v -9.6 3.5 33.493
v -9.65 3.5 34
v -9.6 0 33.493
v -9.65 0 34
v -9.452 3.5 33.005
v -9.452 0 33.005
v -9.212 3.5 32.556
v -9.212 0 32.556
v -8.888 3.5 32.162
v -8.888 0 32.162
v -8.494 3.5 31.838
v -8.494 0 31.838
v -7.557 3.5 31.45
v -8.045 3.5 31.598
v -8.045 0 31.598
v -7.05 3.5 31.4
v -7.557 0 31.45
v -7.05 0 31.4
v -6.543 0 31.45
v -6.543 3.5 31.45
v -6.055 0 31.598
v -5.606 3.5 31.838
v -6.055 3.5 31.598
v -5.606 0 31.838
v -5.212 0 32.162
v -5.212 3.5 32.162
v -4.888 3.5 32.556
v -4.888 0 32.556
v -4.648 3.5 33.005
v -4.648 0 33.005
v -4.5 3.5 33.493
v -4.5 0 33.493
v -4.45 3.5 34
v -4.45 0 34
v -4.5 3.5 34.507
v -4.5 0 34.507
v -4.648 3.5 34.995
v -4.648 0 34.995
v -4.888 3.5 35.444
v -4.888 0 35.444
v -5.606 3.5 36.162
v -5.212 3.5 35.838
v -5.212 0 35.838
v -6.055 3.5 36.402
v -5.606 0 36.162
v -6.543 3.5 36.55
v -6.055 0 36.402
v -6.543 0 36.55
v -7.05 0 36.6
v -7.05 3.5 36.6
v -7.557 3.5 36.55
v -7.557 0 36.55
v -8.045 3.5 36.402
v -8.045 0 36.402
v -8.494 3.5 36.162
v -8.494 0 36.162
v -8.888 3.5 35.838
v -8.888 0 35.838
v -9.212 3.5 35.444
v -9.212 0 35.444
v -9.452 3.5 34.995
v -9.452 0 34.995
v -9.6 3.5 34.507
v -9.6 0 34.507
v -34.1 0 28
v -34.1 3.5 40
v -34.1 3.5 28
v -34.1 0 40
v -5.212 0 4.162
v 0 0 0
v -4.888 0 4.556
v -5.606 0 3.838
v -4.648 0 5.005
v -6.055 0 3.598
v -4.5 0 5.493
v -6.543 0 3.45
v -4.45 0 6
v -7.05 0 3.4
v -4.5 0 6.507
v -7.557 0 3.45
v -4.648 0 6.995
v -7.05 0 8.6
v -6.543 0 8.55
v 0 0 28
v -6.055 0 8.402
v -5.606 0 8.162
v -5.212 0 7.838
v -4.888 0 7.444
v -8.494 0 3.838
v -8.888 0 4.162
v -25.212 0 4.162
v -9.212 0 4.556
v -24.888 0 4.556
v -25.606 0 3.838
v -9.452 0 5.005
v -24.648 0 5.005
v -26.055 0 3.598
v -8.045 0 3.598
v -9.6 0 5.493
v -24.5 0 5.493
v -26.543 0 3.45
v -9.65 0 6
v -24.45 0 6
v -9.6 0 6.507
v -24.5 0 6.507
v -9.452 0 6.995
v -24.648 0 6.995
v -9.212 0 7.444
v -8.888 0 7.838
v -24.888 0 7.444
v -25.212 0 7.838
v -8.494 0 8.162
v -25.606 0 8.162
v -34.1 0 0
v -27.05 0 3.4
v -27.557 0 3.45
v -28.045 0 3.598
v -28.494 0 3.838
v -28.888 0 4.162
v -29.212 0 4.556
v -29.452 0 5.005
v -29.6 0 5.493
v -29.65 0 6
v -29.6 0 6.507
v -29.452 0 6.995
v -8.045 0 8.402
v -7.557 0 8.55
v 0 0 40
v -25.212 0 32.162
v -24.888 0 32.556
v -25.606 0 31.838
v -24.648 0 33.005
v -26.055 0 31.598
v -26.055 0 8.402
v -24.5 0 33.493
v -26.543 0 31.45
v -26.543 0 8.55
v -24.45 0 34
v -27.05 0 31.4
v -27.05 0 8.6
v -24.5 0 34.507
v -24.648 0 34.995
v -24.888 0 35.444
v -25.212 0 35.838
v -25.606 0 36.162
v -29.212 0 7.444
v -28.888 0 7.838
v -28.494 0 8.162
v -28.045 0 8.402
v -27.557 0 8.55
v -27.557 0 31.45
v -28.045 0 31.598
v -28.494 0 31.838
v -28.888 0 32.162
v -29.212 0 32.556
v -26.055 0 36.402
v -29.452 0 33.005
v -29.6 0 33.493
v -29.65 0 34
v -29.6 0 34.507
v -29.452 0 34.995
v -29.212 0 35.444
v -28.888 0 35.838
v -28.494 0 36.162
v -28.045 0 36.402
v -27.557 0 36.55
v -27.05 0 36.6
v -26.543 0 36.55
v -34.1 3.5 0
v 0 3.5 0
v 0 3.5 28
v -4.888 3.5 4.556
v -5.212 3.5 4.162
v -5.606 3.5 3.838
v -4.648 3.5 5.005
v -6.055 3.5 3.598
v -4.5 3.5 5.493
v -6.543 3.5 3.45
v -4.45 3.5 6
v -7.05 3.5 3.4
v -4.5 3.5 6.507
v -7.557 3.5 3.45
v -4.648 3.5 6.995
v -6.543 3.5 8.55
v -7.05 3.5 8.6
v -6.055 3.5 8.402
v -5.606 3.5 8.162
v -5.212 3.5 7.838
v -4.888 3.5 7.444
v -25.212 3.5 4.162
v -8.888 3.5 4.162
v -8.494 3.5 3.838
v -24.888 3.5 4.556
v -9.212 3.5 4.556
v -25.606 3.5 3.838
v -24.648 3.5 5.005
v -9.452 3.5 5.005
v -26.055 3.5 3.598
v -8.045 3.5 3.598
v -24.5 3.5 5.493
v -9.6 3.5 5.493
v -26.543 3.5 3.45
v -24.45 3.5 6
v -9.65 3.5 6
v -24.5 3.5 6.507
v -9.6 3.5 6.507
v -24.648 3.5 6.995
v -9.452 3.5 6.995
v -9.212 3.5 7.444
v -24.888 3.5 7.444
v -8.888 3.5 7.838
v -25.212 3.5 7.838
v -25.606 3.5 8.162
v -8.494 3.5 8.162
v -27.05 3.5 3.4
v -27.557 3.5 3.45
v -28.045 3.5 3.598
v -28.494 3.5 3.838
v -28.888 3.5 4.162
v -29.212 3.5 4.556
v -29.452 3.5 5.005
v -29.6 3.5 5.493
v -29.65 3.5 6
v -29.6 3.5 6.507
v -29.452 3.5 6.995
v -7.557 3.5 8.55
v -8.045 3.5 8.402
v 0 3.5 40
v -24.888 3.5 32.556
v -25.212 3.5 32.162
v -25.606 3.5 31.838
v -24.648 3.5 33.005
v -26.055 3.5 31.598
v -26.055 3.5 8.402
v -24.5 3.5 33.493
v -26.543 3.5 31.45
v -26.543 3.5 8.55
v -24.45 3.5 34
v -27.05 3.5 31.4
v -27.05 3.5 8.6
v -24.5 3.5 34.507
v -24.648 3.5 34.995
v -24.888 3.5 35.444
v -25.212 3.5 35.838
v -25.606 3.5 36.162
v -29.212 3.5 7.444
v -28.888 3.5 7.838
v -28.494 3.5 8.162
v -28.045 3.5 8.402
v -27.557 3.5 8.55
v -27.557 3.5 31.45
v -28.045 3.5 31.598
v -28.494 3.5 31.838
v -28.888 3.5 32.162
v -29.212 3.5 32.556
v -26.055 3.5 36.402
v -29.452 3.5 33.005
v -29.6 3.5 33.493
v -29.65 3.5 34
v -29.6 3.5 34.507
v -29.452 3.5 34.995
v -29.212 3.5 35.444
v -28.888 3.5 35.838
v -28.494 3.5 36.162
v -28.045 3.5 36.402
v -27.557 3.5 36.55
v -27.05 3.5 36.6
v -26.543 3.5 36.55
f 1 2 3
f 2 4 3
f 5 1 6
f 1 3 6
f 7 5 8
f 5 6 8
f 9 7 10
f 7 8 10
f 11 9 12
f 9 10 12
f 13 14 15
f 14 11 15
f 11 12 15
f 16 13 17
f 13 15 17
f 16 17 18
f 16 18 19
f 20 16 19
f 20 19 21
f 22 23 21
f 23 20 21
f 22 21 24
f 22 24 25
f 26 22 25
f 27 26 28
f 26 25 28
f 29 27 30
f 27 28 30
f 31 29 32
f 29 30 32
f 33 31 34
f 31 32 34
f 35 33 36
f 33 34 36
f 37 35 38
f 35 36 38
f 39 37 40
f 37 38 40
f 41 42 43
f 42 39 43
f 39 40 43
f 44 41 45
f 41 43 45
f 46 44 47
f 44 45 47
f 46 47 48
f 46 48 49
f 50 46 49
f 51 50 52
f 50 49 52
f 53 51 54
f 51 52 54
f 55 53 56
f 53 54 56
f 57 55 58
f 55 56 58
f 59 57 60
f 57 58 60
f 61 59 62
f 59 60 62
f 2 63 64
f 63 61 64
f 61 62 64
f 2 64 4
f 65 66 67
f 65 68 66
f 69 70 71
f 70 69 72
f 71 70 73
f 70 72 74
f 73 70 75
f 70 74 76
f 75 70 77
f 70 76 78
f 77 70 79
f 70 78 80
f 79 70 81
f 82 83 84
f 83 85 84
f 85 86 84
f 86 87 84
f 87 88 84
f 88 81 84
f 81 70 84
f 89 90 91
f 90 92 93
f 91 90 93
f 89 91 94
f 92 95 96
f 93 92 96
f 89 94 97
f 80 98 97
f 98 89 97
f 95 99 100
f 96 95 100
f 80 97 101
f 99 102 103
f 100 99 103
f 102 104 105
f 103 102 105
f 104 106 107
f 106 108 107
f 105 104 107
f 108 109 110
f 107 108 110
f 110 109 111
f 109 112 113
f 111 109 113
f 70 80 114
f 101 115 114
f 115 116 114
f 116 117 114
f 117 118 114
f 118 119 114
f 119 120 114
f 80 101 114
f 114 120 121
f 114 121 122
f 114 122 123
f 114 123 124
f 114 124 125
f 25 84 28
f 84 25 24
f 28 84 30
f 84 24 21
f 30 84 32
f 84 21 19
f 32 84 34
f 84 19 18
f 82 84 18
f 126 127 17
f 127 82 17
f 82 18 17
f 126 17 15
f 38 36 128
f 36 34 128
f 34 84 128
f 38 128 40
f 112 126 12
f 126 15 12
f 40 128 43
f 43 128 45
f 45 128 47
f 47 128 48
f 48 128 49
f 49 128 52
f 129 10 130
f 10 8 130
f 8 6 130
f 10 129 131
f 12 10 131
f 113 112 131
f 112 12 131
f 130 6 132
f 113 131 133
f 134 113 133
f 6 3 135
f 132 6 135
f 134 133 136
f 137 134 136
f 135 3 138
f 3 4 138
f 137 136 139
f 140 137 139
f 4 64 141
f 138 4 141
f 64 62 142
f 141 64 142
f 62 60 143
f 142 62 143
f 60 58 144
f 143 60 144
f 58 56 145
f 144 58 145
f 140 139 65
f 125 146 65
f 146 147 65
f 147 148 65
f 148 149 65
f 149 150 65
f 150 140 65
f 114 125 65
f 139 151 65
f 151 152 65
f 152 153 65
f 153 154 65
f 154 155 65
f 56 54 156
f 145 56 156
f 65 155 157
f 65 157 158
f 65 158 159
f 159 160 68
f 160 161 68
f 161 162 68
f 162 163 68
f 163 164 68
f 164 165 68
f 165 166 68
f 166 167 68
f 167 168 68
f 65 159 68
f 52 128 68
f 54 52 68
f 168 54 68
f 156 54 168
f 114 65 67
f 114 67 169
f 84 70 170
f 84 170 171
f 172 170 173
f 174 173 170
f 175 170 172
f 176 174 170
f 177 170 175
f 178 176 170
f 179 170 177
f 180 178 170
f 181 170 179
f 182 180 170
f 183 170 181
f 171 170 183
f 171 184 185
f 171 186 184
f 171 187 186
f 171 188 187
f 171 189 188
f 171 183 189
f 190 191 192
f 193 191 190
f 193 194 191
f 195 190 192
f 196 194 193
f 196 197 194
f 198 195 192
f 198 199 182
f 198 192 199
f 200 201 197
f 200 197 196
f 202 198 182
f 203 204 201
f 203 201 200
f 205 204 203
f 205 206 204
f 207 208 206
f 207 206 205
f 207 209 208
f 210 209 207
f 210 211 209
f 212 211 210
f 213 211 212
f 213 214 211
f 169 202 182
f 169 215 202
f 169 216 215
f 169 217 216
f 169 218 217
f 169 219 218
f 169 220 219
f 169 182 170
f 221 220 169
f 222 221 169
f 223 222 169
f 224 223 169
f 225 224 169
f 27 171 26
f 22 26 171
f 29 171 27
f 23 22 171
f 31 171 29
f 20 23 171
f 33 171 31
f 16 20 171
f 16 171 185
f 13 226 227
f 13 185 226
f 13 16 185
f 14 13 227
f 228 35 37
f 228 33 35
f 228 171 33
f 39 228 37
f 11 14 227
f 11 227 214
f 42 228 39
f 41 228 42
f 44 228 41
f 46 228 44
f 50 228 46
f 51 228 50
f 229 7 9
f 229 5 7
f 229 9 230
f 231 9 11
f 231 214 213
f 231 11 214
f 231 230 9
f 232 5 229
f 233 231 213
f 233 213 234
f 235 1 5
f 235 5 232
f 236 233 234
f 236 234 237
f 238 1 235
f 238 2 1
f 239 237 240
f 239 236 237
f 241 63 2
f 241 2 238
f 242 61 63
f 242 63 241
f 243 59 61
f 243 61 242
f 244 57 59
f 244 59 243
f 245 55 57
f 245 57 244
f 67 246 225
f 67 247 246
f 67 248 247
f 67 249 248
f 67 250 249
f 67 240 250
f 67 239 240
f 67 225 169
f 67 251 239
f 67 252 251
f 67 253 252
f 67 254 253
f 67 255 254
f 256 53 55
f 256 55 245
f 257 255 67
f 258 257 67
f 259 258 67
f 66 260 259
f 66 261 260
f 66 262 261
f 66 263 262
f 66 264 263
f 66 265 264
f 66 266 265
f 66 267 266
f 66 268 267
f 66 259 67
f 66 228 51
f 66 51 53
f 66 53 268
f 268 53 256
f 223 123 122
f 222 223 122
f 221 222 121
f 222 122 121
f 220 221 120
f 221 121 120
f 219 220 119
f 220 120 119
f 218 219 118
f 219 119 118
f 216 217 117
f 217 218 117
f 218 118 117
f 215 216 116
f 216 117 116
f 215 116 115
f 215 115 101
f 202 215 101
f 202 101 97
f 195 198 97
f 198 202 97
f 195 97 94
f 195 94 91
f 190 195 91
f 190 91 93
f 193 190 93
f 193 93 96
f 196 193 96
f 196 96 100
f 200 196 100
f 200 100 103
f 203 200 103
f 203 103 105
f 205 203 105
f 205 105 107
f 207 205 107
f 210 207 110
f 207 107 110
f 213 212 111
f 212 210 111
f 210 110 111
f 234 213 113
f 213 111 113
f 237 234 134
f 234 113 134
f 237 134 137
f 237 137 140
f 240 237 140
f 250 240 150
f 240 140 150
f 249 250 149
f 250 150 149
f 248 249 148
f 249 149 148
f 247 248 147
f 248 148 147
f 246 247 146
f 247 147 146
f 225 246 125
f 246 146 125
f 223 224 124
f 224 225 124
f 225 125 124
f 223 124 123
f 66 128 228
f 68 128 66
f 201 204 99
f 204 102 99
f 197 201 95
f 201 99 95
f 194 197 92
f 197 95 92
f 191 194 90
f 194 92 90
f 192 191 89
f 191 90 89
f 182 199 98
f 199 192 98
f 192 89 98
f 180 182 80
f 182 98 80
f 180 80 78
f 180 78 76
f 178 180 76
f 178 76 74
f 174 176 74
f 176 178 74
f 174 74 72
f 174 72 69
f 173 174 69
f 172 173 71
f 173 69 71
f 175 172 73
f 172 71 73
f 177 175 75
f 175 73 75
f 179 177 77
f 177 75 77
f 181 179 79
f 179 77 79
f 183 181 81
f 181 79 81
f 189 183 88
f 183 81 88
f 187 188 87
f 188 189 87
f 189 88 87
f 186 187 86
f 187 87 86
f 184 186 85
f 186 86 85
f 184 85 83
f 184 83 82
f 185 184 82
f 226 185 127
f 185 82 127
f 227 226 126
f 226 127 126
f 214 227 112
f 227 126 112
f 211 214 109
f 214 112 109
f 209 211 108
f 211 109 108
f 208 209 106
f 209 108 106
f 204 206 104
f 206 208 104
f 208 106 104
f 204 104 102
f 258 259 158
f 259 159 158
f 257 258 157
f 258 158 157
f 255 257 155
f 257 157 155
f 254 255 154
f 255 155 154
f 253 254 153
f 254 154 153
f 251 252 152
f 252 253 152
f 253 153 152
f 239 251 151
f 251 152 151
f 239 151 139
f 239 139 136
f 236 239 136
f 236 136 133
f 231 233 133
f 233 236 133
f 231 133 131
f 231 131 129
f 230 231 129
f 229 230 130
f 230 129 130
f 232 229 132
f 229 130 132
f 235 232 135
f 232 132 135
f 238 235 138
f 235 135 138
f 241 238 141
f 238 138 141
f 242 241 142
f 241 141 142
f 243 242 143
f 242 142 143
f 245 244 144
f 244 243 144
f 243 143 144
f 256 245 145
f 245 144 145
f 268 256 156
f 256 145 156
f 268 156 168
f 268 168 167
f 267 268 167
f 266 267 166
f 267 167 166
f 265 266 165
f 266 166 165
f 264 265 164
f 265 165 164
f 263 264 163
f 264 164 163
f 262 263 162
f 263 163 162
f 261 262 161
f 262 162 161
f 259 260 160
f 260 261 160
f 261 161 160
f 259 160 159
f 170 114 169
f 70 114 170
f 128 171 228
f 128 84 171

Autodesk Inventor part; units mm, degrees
ref_plane "YZ Plane" through (0, 0, 0) normal (1, 0, 0) x (0, 1, 0)
ref_plane "XZ Plane" through (0, 0, 0) normal (0, 1, 0) x (-1, 0, 0)
ref_plane "XY Plane" through (0, 0, 0) normal (0, 0, 1) x (1, 0, 0)
sketch "Sketch1" plane through (0, 0, 0) normal (0, 1, 0) x (-1, 0, 0)
  line L0 (17.2372, 12) -> (17.2372, 28) construction
  line L1 (14.9628, 12) -> (17.2372, 12) construction
  line L2 (14.9628, 12) -> (14.9628, 28) construction
  line L3 (17.2372, 28) -> (14.9628, 28) construction
  line L4 (14.2372, 12) -> (14.2372, 28) construction
  line L5 (11.9628, 12) -> (14.2372, 12) construction
  line L6 (11.9628, 12) -> (11.9628, 28) construction
  line L7 (14.2372, 28) -> (11.9628, 28) construction
  line L8 (20.2372, 28) -> (17.9628, 28) construction
  line L9 (20.2372, 12) -> (20.2372, 28) construction
  line L10 (17.9628, 12) -> (20.2372, 12) construction
  line L11 (17.9628, 12) -> (17.9628, 28) construction
  line L12 (11.2372, 12) -> (11.2372, 28) construction
  line L13 (8.9628, 12) -> (11.2372, 12) construction
  line L14 (8.9628, 12) -> (8.9628, 28) construction
  line L15 (11.2372, 28) -> (8.9628, 28) construction
  line L16 (23.2372, 28) -> (20.9628, 28) construction
  line L17 (23.2372, 12) -> (23.2372, 28) construction
  line L18 (20.9628, 12) -> (23.2372, 12) construction
  line L19 (20.9628, 12) -> (20.9628, 28) construction
  line L20 (8.2372, 12) -> (8.2372, 28) construction
  line L21 (5.9628, 12) -> (8.2372, 12) construction
  line L22 (5.9628, 12) -> (5.9628, 28) construction
  line L23 (8.2372, 28) -> (5.9628, 28) construction
  line L24 (26.2372, 28) -> (23.9628, 28) construction
  line L25 (26.2372, 12) -> (26.2372, 28) construction
  line L26 (23.9628, 12) -> (26.2372, 12) construction
  line L27 (23.9628, 12) -> (23.9628, 28) construction
  line L28 (5.2372, 12) -> (5.2372, 28) construction
  line L29 (2.9628, 12) -> (5.2372, 12) construction
  line L30 (2.9628, 12) -> (2.9628, 28) construction
  line L31 (5.2372, 28) -> (2.9628, 28) construction
  line L32 (29.2372, 28) -> (26.9628, 28) construction
  line L33 (29.2372, 12) -> (29.2372, 28) construction
  line L34 (26.9628, 12) -> (29.2372, 12) construction
  line L35 (26.9628, 12) -> (26.9628, 28) construction
  line L36 (2.2372, 12) -> (2.2372, 28) construction
  line L37 (0, 12) -> (2.2372, 12) construction
  line L38 (0, 0) -> (0, 28)
  line L39 (34.1, 0) -> (0, 0)
  line L40 (34.1, 28) -> (34.1, 0)
  line L41 (32.9628, 12) -> (34.1, 12) construction
  line L42 (32.9628, 12) -> (32.9628, 28) construction
  line L43 (34.1, 28) -> (32.9628, 28) construction
  line L44 (34.1, 40) -> (34.1, 28)
  line L45 (0, 40) -> (34.1, 40)
  line L46 (0, 28) -> (0, 40)
  line L47 (2.2372, 28) -> (0, 28) construction
  circle A0 centre (7.05, 34) radius 2.6
  circle A1 centre (27.05, 34) radius 2.6
  circle A2 centre (27.05, 6) radius 2.6
  circle A3 centre (7.05, 6) radius 2.6
  line L48 (32.2372, 28) -> (29.9628, 28) construction
  line L49 (32.2372, 12) -> (32.2372, 28) construction
  line L50 (29.9628, 12) -> (32.2372, 12) construction
  line L51 (29.9628, 12) -> (29.9628, 28) construction
extrude "Extrusion1" add sketch "Sketch1" along normal blind 3.5
properties part number "Y Axis Belt Adjustable Top"
